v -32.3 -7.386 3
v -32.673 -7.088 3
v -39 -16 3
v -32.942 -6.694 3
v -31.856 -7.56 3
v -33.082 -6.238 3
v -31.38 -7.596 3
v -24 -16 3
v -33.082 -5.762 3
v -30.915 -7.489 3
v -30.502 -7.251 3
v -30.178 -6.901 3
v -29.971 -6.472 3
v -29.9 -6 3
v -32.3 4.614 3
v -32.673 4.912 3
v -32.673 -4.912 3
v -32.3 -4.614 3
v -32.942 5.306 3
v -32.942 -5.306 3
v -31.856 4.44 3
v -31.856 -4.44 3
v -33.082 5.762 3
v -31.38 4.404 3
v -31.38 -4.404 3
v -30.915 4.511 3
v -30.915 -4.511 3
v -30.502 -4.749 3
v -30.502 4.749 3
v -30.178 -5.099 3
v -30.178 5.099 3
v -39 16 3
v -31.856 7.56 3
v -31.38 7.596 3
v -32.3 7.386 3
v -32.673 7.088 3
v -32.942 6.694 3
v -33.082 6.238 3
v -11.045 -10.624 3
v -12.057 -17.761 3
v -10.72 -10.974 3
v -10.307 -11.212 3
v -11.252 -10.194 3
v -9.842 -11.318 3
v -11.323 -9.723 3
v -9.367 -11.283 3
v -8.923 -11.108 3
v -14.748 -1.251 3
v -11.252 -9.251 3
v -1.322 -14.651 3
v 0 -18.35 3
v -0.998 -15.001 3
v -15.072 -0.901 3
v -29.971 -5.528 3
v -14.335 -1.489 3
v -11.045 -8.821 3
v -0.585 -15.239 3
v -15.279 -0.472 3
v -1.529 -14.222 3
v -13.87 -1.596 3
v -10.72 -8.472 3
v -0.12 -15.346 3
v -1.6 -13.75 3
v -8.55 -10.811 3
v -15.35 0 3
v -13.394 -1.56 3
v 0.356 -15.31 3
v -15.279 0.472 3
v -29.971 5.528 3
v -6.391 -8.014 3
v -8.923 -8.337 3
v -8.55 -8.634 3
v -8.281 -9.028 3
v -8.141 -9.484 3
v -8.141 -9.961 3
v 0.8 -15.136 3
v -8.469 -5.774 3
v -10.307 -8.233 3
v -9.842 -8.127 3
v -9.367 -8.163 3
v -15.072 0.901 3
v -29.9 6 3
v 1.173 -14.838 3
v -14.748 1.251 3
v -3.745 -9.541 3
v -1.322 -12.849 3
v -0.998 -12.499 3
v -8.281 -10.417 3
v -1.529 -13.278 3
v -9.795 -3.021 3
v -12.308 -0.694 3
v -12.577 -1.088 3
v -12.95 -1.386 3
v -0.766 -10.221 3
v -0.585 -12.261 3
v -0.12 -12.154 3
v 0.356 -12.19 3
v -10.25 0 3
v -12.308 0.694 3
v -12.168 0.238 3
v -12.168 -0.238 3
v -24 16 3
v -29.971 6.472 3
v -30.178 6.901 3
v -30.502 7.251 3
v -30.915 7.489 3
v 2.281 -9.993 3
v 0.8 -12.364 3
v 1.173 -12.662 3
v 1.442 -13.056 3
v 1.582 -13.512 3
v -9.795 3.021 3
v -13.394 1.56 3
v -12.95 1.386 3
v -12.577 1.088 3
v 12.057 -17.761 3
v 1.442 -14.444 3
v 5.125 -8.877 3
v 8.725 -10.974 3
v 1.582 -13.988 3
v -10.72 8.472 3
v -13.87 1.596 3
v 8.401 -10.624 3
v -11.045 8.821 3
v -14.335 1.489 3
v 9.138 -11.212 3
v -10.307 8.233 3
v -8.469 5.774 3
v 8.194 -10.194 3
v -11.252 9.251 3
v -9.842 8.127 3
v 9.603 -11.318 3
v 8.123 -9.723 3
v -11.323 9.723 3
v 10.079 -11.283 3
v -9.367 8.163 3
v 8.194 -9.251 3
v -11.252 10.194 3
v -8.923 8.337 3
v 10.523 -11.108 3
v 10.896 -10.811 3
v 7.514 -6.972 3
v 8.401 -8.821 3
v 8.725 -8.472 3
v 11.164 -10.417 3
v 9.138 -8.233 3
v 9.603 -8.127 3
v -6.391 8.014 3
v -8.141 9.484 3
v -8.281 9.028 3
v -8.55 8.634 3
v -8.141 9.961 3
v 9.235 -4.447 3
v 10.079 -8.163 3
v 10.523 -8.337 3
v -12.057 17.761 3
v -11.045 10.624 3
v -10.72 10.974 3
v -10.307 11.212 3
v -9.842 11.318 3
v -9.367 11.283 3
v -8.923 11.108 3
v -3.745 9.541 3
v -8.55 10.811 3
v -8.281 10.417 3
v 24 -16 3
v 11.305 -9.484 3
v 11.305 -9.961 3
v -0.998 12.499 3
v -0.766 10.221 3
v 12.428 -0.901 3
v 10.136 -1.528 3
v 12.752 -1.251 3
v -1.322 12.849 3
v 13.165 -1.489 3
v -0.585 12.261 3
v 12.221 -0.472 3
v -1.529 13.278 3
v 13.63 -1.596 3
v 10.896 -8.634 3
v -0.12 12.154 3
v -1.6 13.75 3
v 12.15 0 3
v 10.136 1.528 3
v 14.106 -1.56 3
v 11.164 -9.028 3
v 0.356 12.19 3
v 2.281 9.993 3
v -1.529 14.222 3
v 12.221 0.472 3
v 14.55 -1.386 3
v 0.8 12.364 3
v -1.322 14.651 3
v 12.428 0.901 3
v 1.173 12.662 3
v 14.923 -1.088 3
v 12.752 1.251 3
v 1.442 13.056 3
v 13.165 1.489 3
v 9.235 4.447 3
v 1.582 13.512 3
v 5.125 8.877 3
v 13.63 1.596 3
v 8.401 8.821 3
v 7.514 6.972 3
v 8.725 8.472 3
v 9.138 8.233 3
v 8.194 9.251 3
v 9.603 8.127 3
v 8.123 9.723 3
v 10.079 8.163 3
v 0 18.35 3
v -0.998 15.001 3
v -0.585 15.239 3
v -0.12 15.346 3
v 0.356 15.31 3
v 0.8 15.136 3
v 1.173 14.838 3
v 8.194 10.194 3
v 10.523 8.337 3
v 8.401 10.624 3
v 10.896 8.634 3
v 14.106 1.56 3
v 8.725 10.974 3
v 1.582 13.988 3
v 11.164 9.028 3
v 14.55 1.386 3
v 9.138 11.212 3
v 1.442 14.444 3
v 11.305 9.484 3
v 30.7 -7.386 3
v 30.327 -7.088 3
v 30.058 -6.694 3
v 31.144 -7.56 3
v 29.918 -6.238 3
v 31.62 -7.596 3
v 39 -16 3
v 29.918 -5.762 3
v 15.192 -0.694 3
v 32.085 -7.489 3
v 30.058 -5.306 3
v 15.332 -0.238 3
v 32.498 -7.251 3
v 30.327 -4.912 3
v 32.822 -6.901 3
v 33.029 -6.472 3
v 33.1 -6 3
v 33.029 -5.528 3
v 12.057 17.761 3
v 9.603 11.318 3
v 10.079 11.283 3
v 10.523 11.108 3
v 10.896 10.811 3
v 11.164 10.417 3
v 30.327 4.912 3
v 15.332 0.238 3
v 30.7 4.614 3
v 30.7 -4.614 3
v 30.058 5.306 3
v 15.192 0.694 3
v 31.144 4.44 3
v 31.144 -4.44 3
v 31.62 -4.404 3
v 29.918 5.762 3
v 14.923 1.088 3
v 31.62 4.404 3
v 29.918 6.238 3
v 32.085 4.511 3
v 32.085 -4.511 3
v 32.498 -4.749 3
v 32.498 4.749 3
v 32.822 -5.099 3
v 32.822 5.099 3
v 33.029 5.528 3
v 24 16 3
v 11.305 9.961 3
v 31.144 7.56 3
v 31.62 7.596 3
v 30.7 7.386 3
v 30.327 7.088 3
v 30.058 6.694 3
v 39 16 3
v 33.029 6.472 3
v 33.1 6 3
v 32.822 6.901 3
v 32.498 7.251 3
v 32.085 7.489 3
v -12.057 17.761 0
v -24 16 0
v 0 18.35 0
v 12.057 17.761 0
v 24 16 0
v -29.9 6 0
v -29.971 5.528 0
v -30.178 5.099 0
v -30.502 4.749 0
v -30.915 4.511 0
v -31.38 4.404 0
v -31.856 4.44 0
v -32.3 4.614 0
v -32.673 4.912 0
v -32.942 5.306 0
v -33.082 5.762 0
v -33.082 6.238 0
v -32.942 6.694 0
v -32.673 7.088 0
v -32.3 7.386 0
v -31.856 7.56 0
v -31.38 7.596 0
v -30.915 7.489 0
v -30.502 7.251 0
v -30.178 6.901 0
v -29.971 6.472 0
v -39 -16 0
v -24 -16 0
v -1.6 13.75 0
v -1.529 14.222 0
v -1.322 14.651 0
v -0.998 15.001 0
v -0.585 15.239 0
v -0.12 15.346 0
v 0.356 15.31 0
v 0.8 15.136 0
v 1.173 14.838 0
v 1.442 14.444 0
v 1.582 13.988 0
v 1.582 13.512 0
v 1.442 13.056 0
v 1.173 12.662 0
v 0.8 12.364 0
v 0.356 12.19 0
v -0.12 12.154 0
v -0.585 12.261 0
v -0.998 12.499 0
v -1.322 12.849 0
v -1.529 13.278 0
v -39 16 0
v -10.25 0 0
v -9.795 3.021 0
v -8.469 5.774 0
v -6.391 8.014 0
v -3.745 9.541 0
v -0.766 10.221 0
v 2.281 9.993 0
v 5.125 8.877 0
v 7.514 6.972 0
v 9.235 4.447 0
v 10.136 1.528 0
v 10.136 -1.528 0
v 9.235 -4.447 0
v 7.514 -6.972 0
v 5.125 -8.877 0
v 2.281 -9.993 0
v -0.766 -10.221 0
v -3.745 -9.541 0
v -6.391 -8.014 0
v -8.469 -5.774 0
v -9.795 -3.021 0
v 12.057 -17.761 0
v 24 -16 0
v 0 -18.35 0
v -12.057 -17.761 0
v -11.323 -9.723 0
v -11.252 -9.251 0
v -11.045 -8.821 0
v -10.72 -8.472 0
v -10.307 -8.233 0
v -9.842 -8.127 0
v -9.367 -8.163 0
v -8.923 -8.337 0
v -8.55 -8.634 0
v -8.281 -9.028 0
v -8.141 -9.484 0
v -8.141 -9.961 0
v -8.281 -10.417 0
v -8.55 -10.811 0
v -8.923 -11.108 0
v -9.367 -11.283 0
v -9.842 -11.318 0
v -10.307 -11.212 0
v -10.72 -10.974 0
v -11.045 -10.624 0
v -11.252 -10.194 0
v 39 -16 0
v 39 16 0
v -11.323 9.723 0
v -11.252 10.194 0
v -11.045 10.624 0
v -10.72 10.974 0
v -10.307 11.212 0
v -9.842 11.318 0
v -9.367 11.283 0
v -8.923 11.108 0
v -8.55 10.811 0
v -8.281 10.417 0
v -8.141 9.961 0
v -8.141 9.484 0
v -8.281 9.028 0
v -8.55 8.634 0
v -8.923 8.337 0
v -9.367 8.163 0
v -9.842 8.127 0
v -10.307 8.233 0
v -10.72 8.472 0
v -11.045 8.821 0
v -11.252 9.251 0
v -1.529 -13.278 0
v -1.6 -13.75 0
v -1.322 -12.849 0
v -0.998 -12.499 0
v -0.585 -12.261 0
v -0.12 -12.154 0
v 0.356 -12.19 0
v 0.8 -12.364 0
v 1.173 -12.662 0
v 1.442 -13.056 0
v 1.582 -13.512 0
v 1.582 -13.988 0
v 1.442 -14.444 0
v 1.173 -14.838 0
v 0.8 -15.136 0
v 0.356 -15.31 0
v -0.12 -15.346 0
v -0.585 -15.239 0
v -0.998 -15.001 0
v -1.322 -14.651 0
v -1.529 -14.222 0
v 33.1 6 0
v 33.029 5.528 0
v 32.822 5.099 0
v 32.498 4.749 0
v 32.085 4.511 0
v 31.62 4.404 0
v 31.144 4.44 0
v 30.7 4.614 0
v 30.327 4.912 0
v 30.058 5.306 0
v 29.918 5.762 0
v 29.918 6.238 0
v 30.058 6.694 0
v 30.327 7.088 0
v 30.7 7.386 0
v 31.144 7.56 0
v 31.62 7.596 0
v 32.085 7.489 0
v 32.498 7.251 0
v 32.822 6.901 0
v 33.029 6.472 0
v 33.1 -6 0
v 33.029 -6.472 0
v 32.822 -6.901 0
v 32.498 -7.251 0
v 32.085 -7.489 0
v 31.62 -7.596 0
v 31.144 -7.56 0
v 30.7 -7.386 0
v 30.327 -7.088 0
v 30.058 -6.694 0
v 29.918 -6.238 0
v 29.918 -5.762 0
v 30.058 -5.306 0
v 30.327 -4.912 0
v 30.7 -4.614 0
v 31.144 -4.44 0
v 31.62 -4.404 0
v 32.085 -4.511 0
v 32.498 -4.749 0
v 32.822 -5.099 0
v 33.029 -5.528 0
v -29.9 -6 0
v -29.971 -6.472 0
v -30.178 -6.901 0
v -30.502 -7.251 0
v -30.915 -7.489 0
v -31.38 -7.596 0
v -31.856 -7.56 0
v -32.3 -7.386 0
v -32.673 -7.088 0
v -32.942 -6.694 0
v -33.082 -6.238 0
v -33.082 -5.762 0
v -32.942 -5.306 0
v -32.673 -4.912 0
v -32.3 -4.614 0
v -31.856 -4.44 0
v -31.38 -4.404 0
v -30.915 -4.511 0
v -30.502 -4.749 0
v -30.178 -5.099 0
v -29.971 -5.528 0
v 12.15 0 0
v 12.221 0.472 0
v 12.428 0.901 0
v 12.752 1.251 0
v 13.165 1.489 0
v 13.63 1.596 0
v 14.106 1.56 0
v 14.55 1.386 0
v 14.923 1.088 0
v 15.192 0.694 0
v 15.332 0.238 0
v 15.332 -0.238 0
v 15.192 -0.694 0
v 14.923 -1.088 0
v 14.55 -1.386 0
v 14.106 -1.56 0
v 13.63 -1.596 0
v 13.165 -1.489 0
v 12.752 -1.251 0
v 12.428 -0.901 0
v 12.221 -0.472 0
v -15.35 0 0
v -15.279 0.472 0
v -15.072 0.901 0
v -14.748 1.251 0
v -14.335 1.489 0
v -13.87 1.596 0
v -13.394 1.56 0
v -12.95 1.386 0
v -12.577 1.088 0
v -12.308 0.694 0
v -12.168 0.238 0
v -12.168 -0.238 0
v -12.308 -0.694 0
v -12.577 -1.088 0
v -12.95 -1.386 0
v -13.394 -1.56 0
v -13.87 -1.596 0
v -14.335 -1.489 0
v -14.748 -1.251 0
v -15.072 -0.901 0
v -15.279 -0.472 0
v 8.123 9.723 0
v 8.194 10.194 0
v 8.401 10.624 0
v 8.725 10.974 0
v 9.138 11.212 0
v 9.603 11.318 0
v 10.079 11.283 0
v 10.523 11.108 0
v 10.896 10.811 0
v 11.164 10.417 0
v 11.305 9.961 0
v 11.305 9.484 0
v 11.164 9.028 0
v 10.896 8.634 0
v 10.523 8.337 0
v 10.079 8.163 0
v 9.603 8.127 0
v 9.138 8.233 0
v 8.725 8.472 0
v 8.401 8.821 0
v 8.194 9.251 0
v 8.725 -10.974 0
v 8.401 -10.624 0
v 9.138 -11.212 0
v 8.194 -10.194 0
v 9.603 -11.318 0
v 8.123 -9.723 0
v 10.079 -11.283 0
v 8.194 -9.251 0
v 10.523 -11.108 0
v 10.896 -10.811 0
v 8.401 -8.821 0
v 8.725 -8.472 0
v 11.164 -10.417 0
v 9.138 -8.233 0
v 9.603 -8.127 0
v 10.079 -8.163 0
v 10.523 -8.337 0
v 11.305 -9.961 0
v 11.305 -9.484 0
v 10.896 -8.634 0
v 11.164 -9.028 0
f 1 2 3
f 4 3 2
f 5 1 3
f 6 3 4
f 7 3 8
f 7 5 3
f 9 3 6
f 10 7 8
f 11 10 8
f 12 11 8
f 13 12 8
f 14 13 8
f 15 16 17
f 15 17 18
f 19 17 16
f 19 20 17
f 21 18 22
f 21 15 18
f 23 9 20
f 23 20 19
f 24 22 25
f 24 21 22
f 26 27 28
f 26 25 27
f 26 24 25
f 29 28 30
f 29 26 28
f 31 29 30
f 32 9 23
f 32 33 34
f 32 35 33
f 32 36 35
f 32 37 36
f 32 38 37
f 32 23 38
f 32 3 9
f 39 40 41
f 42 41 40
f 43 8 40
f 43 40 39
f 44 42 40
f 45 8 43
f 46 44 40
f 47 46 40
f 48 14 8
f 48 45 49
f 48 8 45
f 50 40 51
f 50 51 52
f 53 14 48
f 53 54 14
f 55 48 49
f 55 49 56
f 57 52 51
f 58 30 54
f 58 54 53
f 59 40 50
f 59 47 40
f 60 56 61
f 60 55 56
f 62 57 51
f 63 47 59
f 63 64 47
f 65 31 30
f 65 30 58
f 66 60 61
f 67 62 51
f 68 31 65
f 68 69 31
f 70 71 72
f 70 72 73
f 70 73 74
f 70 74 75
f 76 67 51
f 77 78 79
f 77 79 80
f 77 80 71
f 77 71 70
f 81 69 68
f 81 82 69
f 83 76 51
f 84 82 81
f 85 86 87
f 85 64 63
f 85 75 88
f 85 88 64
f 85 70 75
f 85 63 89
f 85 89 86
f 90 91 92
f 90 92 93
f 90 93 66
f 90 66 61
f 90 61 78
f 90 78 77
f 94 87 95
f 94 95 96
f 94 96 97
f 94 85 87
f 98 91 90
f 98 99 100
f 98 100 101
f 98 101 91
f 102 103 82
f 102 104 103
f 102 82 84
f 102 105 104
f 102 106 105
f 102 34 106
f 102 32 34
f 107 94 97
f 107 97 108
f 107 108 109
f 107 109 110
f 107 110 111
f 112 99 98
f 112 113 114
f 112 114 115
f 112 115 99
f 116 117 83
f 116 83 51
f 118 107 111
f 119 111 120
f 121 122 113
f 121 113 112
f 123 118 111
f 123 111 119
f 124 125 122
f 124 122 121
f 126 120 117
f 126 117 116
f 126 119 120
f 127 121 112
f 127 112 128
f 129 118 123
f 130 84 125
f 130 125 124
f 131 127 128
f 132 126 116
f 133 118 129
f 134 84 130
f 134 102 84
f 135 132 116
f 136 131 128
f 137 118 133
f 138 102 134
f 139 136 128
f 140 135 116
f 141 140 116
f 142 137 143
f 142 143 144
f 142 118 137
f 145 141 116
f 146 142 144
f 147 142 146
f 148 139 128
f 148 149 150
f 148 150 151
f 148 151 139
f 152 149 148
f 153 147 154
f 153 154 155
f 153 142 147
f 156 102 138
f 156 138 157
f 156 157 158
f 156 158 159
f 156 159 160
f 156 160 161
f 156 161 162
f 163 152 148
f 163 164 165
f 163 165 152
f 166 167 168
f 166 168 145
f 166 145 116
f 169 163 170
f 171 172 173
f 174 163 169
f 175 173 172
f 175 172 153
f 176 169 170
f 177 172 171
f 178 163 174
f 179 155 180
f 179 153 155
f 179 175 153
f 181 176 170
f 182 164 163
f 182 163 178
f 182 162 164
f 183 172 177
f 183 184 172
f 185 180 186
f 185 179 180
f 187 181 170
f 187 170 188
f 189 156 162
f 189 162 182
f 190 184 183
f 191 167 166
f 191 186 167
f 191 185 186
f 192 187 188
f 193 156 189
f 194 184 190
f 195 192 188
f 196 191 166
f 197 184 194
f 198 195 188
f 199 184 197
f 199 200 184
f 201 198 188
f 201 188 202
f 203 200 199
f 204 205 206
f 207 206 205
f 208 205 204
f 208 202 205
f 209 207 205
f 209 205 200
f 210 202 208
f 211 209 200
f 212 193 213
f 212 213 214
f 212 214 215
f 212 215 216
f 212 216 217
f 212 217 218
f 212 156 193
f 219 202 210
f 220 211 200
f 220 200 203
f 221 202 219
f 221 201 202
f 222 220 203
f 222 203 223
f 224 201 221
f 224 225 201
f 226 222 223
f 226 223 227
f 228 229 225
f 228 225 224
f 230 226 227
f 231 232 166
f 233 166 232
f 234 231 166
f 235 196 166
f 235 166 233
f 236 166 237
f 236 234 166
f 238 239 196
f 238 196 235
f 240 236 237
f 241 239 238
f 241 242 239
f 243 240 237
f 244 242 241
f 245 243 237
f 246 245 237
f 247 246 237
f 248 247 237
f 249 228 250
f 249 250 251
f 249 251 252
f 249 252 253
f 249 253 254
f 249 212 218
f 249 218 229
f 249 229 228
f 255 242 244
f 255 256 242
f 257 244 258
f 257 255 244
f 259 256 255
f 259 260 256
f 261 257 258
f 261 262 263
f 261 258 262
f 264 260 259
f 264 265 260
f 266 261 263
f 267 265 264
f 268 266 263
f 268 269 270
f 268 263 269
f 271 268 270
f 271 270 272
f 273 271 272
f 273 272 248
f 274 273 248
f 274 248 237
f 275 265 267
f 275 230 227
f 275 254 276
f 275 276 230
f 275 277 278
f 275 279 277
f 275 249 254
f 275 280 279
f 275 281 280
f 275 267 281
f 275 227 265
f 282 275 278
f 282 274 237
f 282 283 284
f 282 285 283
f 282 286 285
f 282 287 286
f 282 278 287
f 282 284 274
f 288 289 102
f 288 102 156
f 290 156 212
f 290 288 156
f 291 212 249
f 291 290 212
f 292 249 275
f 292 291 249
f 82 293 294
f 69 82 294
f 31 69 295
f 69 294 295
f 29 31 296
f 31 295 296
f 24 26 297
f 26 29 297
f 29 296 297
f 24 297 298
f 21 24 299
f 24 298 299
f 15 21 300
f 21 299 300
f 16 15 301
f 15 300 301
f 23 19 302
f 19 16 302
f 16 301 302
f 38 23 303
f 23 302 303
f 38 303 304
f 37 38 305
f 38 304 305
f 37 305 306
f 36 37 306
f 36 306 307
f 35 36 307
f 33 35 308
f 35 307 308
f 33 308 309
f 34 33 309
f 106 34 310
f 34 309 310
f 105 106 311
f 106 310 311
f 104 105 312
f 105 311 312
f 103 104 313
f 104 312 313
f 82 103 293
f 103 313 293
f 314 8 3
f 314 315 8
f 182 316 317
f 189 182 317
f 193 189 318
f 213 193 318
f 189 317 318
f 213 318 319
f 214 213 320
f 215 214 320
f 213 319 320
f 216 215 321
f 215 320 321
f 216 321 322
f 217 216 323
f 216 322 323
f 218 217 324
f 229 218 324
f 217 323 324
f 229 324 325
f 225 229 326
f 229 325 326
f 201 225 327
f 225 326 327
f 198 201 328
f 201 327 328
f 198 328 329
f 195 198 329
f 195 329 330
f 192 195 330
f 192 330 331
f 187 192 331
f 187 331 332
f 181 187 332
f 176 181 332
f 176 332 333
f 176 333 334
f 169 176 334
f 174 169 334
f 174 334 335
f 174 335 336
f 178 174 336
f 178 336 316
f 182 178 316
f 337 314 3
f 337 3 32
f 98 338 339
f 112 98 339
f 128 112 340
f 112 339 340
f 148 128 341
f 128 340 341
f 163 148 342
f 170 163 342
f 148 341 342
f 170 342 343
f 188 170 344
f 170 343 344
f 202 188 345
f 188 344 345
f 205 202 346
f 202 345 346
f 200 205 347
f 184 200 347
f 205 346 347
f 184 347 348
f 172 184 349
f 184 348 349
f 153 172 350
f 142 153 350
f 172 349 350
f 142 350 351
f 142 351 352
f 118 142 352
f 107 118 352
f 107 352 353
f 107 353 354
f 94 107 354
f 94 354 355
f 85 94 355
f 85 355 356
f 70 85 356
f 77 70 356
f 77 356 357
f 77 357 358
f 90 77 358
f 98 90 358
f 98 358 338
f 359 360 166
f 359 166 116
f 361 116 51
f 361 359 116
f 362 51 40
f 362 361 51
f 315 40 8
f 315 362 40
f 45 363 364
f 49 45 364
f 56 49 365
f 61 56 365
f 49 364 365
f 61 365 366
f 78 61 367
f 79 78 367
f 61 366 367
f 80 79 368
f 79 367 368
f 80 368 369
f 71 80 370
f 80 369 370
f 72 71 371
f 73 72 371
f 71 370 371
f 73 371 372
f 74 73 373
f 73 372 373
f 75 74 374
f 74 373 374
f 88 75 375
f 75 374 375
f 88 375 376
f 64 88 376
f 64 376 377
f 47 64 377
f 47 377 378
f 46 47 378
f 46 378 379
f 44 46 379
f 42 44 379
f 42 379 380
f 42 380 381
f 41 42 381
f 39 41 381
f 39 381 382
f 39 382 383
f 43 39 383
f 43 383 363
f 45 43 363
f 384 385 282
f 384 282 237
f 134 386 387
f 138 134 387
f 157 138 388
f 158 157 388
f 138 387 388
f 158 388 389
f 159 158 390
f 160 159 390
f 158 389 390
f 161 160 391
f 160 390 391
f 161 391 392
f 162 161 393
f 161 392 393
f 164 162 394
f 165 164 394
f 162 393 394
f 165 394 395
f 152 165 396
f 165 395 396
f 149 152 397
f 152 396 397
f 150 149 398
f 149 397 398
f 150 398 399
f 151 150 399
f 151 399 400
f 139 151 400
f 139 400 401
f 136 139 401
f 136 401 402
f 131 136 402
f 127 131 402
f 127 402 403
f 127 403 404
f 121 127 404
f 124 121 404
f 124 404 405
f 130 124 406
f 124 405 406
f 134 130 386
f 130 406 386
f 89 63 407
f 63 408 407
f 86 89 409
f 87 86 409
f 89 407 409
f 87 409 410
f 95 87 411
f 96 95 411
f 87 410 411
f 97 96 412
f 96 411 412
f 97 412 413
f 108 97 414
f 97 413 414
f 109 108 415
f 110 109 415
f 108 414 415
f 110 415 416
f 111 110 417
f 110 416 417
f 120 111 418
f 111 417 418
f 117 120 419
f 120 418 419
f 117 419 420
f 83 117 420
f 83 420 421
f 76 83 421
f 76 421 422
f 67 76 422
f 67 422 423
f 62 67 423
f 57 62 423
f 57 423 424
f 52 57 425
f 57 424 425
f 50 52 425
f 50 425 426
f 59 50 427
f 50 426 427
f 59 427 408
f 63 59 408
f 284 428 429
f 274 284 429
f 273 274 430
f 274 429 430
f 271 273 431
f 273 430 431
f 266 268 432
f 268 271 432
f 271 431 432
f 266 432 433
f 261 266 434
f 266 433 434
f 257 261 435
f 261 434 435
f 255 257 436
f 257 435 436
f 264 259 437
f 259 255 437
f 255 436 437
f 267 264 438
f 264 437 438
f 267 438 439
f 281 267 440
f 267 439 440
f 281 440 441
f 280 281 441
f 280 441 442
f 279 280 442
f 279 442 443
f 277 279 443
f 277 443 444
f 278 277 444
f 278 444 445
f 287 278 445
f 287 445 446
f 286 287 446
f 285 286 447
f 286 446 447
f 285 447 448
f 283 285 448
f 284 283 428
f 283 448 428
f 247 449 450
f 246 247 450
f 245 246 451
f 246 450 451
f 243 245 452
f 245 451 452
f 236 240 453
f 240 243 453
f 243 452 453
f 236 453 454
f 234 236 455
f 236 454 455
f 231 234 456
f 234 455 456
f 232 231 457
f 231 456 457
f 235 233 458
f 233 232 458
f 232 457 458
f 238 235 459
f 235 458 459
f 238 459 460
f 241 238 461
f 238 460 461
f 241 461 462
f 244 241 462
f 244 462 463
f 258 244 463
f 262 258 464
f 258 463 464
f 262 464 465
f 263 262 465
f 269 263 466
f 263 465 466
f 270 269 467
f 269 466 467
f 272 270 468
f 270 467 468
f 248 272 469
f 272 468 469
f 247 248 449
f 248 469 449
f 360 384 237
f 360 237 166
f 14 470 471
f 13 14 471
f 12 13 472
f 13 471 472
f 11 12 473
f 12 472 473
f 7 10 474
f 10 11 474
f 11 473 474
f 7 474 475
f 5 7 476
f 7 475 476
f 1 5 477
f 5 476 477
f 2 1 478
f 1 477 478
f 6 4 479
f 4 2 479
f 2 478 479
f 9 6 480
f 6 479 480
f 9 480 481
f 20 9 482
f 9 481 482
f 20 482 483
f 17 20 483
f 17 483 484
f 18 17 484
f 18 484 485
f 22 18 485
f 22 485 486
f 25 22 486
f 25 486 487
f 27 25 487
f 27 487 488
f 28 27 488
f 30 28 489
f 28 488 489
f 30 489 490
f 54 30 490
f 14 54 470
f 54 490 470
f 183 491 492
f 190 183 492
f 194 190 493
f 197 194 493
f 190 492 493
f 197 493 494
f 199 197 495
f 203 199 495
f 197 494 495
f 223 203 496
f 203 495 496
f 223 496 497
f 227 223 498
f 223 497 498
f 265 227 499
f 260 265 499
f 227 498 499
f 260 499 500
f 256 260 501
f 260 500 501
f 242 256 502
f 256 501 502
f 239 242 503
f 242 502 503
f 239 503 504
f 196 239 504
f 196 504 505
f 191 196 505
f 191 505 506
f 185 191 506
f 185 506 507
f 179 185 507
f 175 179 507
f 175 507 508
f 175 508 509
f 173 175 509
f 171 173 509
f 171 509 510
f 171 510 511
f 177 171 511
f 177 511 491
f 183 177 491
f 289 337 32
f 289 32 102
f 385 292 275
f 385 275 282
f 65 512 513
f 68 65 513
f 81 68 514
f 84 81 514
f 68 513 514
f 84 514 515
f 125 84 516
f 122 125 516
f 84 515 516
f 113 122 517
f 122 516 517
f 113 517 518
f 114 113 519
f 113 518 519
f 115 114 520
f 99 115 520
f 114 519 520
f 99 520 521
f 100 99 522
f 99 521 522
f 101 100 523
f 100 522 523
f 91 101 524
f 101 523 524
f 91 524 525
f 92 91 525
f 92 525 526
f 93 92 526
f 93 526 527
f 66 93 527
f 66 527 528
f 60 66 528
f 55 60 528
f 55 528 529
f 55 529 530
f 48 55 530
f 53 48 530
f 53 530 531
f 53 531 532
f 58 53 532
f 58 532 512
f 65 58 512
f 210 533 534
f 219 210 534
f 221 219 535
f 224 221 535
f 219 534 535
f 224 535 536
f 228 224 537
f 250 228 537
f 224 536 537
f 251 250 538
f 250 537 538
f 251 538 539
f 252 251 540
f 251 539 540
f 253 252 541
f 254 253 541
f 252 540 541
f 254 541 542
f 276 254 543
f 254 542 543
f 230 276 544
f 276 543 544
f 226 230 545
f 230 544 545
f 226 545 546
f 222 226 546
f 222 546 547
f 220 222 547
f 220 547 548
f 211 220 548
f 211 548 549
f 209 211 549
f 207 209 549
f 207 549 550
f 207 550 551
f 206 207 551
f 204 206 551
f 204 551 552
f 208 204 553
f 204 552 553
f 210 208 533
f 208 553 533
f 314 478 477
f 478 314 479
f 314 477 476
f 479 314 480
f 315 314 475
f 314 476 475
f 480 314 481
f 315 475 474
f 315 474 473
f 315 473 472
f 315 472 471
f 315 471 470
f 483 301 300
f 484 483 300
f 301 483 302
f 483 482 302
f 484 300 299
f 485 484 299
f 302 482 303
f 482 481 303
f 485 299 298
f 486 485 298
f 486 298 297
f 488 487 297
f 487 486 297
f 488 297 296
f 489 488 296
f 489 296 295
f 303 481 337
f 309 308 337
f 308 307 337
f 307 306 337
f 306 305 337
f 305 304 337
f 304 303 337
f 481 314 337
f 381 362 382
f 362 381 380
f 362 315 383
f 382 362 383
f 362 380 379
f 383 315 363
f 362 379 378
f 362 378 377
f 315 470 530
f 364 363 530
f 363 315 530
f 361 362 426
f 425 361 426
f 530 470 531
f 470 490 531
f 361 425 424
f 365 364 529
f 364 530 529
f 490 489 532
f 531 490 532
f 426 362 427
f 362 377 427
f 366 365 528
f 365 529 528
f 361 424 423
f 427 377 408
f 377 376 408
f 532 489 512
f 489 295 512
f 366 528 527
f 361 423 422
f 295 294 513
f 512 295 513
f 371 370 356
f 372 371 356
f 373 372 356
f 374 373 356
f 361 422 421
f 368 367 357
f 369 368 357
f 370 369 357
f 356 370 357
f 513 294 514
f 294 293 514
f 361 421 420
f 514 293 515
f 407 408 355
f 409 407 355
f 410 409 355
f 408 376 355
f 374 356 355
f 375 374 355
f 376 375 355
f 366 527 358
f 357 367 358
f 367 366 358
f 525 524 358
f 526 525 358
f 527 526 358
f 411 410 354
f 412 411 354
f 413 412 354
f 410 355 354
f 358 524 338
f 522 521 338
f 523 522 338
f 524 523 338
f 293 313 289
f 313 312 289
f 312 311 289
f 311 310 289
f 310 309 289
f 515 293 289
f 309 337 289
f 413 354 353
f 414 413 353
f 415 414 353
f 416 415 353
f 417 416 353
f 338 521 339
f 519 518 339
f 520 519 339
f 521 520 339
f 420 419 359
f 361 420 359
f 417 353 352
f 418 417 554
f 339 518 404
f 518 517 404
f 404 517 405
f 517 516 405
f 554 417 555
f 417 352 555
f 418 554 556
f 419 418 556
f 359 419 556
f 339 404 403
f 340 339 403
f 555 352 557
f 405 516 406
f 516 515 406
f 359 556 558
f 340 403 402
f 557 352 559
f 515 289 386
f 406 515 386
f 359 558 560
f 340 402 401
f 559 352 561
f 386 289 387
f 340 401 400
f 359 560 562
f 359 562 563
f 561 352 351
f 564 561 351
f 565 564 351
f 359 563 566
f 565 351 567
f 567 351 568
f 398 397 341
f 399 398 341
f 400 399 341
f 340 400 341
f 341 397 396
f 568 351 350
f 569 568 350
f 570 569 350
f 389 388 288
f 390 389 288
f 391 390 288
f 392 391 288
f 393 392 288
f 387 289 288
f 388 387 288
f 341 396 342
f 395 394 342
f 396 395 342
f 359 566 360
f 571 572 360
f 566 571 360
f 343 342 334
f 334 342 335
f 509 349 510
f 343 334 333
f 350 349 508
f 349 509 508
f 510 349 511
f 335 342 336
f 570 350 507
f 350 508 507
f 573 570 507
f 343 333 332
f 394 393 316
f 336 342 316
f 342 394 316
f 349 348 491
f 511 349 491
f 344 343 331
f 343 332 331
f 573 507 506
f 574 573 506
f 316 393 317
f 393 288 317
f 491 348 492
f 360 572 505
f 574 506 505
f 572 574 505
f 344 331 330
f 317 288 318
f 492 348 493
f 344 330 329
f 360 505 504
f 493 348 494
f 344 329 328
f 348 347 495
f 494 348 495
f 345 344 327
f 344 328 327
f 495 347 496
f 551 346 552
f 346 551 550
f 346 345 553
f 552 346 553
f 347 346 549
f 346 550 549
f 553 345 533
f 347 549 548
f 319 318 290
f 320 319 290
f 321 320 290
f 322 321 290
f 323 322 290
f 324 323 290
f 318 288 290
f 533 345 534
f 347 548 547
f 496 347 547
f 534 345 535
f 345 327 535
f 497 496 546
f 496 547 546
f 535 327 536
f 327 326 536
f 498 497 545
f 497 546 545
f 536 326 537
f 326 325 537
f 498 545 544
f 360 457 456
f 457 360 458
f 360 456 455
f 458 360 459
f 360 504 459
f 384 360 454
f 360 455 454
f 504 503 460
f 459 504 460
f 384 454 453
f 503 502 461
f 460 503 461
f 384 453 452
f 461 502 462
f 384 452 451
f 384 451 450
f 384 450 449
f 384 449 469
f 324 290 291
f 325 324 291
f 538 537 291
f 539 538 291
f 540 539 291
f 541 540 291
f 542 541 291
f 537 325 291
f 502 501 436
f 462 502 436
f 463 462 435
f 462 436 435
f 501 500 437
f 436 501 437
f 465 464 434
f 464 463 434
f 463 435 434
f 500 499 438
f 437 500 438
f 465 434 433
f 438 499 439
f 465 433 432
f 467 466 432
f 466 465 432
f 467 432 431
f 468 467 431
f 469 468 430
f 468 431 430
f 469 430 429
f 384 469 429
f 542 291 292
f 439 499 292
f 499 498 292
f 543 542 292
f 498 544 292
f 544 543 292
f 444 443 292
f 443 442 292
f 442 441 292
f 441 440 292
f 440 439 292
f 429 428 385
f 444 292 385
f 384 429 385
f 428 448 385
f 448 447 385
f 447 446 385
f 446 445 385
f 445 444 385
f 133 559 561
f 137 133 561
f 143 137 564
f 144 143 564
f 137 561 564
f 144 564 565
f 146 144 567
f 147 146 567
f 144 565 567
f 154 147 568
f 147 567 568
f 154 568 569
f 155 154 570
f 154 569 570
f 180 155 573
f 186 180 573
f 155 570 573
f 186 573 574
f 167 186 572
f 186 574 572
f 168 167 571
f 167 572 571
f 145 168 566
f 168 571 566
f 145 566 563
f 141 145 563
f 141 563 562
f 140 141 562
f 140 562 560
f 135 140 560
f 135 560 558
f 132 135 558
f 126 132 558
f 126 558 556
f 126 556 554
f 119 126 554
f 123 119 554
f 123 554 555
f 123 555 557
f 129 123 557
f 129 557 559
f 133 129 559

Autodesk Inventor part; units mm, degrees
ref_plane "YZ Plane" through (0, 0, 0) normal (1, 0, 0) x (0, 1, 0)
ref_plane "XZ Plane" through (0, 0, 0) normal (0, 1, 0) x (-1, 0, 0)
ref_plane "XY Plane" through (0, 0, 0) normal (0, 0, 1) x (1, 0, 0)
sketch "スケッチ1" plane through (0, 0, 0) normal (0, 0, 1) x (1, 0, 0)
  line L0 (-39, -16) -> (-39, 16)
  line L1 (39, 16) -> (39, -16)
  line L2 (39, -16) -> (-39, 16) construction
  line L3 (-39, -16) -> (39, 16) construction
  line L4 (0, 0) -> (0, 16) construction
  line L5 (0, 0) -> (-39, 0) construction
  line L6 (-39, 16) -> (-24, 16)
  line L7 (-24, 16) -> (-24, -16) construction
  line L8 (-31.5, 16) -> (-31.5, -16) construction
  line L9 (-24, 0) -> (-39, 0) construction
  circle A0 centre (-31.5, 6) radius 1.6
  circle A1 centre (-31.5, -6) radius 1.6
  line L10 (24, 16) -> (24, -16) construction
  line L11 (31.5, 16) -> (31.5, -16) construction
  line L12 (24, 0) -> (39, 0) construction
  circle A2 centre (31.5, 6) radius 1.6
  circle A3 centre (31.5, -6) radius 1.6
  line L13 (-39, 16) -> (-24, 16)
  line L14 (24, 16) -> (39, 16)
  line L15 (39, -16) -> (24, -16)
  line L16 (-24, -16) -> (-39, -16)
  circle A4 centre (0, 0) radius 13.75
  circle A5 centre (0, 13.75) radius 1.6
  circle A6 centre (0, -13.75) radius 1.6
  arc A7 (24, 16) -> (-24, 16) centre (0, -105.3782) ccw
  arc A8 (-24, -16) -> (24, -16) centre (0, 105.3782) ccw
  dimension "d5" = 78
  dimension "d6" = 32
  dimension "d7" = 15
  dimension "d8" = 3.2
  dimension "d9" = 6
  dimension "d44" = 27.5
  dimension "d45" = 3.2
  dimension "d46" = 3.2
  dimension "d47" = 3
  dimension "d48" = 3
extrude "押し出し2" add sketch "スケッチ1" along normal blind 3 contours L0 L6 A7 L14 L1 L15 A8 L16 | A4 A6 A5 | A5 A4 | A4 A5 | A6 A4 | A4 A6
sketch "スケッチ4" plane through (0, 0, 0) normal (0, 0, -1) x (-1, 0, 0)
  circle A0 centre (-31.5, 6) radius 1.6 projected
  circle A1 centre (-31.5, -6) radius 1.6 projected
  circle A2 centre (31.5, -6) radius 1.6 projected
  circle A3 centre (31.5, 6) radius 1.6 projected
  line L0 (24, 16) -> (39, 16) projected
  line L1 (-39, 16) -> (-24, 16) projected
  line L2 (-39, -16) -> (-39, 16) projected
  line L3 (-24, -16) -> (-39, -16) projected
  line L4 (39, -16) -> (24, -16) projected
  line L5 (39, 16) -> (39, -16) projected
  line L6 (-39, 0) -> (39, 0) construction
  line L7 (0, 36) -> (0, -36) construction
  circle A4 centre (0, 0) radius 10.25
  circle A5 centre (0, 0) radius 13.75 construction
  circle A6 centre (0, 13.75) radius 1.6
  circle A7 centre (0, 0) radius 13.75 construction
  circle A8 centre (-9.7227, 9.7227) radius 1.6
  circle A9 centre (0, 0) radius 13.75 construction
  circle A10 centre (-13.75, 0) radius 1.6
  circle A11 centre (0, 0) radius 13.75 construction
  circle A12 centre (-9.7227, -9.7227) radius 1.6
  circle A13 centre (0, 0) radius 13.75 construction
  circle A14 centre (0, -13.75) radius 1.6
  circle A15 centre (0, 0) radius 13.75 construction
  circle A16 centre (9.7227, -9.7227) radius 1.6
  circle A17 centre (0, 0) radius 13.75 construction
  circle A18 centre (13.75, 0) radius 1.6
  circle A19 centre (0, 0) radius 13.75 construction
  circle A20 centre (9.7227, 9.7227) radius 1.6
  arc A21 (24, 16) -> (-24, 16) centre (0, -105.3782) ccw projected
  arc A22 (-24, -16) -> (24, -16) centre (0, 105.3782) ccw projected
  dimension "d17" = 27.5
  dimension "d16" = 20.5
  dimension "d18" = 3.2
  dimension "d21" = 360
extrude "押し出し4" cut sketch "スケッチ4" against normal through all contours A4 | A6 | A8 | A10 | A12 | A14 | A16 | A18 | A20
properties part number "サーボ支え板B_アルミ(A2017)_t3" material "アルミニウム 6061"
